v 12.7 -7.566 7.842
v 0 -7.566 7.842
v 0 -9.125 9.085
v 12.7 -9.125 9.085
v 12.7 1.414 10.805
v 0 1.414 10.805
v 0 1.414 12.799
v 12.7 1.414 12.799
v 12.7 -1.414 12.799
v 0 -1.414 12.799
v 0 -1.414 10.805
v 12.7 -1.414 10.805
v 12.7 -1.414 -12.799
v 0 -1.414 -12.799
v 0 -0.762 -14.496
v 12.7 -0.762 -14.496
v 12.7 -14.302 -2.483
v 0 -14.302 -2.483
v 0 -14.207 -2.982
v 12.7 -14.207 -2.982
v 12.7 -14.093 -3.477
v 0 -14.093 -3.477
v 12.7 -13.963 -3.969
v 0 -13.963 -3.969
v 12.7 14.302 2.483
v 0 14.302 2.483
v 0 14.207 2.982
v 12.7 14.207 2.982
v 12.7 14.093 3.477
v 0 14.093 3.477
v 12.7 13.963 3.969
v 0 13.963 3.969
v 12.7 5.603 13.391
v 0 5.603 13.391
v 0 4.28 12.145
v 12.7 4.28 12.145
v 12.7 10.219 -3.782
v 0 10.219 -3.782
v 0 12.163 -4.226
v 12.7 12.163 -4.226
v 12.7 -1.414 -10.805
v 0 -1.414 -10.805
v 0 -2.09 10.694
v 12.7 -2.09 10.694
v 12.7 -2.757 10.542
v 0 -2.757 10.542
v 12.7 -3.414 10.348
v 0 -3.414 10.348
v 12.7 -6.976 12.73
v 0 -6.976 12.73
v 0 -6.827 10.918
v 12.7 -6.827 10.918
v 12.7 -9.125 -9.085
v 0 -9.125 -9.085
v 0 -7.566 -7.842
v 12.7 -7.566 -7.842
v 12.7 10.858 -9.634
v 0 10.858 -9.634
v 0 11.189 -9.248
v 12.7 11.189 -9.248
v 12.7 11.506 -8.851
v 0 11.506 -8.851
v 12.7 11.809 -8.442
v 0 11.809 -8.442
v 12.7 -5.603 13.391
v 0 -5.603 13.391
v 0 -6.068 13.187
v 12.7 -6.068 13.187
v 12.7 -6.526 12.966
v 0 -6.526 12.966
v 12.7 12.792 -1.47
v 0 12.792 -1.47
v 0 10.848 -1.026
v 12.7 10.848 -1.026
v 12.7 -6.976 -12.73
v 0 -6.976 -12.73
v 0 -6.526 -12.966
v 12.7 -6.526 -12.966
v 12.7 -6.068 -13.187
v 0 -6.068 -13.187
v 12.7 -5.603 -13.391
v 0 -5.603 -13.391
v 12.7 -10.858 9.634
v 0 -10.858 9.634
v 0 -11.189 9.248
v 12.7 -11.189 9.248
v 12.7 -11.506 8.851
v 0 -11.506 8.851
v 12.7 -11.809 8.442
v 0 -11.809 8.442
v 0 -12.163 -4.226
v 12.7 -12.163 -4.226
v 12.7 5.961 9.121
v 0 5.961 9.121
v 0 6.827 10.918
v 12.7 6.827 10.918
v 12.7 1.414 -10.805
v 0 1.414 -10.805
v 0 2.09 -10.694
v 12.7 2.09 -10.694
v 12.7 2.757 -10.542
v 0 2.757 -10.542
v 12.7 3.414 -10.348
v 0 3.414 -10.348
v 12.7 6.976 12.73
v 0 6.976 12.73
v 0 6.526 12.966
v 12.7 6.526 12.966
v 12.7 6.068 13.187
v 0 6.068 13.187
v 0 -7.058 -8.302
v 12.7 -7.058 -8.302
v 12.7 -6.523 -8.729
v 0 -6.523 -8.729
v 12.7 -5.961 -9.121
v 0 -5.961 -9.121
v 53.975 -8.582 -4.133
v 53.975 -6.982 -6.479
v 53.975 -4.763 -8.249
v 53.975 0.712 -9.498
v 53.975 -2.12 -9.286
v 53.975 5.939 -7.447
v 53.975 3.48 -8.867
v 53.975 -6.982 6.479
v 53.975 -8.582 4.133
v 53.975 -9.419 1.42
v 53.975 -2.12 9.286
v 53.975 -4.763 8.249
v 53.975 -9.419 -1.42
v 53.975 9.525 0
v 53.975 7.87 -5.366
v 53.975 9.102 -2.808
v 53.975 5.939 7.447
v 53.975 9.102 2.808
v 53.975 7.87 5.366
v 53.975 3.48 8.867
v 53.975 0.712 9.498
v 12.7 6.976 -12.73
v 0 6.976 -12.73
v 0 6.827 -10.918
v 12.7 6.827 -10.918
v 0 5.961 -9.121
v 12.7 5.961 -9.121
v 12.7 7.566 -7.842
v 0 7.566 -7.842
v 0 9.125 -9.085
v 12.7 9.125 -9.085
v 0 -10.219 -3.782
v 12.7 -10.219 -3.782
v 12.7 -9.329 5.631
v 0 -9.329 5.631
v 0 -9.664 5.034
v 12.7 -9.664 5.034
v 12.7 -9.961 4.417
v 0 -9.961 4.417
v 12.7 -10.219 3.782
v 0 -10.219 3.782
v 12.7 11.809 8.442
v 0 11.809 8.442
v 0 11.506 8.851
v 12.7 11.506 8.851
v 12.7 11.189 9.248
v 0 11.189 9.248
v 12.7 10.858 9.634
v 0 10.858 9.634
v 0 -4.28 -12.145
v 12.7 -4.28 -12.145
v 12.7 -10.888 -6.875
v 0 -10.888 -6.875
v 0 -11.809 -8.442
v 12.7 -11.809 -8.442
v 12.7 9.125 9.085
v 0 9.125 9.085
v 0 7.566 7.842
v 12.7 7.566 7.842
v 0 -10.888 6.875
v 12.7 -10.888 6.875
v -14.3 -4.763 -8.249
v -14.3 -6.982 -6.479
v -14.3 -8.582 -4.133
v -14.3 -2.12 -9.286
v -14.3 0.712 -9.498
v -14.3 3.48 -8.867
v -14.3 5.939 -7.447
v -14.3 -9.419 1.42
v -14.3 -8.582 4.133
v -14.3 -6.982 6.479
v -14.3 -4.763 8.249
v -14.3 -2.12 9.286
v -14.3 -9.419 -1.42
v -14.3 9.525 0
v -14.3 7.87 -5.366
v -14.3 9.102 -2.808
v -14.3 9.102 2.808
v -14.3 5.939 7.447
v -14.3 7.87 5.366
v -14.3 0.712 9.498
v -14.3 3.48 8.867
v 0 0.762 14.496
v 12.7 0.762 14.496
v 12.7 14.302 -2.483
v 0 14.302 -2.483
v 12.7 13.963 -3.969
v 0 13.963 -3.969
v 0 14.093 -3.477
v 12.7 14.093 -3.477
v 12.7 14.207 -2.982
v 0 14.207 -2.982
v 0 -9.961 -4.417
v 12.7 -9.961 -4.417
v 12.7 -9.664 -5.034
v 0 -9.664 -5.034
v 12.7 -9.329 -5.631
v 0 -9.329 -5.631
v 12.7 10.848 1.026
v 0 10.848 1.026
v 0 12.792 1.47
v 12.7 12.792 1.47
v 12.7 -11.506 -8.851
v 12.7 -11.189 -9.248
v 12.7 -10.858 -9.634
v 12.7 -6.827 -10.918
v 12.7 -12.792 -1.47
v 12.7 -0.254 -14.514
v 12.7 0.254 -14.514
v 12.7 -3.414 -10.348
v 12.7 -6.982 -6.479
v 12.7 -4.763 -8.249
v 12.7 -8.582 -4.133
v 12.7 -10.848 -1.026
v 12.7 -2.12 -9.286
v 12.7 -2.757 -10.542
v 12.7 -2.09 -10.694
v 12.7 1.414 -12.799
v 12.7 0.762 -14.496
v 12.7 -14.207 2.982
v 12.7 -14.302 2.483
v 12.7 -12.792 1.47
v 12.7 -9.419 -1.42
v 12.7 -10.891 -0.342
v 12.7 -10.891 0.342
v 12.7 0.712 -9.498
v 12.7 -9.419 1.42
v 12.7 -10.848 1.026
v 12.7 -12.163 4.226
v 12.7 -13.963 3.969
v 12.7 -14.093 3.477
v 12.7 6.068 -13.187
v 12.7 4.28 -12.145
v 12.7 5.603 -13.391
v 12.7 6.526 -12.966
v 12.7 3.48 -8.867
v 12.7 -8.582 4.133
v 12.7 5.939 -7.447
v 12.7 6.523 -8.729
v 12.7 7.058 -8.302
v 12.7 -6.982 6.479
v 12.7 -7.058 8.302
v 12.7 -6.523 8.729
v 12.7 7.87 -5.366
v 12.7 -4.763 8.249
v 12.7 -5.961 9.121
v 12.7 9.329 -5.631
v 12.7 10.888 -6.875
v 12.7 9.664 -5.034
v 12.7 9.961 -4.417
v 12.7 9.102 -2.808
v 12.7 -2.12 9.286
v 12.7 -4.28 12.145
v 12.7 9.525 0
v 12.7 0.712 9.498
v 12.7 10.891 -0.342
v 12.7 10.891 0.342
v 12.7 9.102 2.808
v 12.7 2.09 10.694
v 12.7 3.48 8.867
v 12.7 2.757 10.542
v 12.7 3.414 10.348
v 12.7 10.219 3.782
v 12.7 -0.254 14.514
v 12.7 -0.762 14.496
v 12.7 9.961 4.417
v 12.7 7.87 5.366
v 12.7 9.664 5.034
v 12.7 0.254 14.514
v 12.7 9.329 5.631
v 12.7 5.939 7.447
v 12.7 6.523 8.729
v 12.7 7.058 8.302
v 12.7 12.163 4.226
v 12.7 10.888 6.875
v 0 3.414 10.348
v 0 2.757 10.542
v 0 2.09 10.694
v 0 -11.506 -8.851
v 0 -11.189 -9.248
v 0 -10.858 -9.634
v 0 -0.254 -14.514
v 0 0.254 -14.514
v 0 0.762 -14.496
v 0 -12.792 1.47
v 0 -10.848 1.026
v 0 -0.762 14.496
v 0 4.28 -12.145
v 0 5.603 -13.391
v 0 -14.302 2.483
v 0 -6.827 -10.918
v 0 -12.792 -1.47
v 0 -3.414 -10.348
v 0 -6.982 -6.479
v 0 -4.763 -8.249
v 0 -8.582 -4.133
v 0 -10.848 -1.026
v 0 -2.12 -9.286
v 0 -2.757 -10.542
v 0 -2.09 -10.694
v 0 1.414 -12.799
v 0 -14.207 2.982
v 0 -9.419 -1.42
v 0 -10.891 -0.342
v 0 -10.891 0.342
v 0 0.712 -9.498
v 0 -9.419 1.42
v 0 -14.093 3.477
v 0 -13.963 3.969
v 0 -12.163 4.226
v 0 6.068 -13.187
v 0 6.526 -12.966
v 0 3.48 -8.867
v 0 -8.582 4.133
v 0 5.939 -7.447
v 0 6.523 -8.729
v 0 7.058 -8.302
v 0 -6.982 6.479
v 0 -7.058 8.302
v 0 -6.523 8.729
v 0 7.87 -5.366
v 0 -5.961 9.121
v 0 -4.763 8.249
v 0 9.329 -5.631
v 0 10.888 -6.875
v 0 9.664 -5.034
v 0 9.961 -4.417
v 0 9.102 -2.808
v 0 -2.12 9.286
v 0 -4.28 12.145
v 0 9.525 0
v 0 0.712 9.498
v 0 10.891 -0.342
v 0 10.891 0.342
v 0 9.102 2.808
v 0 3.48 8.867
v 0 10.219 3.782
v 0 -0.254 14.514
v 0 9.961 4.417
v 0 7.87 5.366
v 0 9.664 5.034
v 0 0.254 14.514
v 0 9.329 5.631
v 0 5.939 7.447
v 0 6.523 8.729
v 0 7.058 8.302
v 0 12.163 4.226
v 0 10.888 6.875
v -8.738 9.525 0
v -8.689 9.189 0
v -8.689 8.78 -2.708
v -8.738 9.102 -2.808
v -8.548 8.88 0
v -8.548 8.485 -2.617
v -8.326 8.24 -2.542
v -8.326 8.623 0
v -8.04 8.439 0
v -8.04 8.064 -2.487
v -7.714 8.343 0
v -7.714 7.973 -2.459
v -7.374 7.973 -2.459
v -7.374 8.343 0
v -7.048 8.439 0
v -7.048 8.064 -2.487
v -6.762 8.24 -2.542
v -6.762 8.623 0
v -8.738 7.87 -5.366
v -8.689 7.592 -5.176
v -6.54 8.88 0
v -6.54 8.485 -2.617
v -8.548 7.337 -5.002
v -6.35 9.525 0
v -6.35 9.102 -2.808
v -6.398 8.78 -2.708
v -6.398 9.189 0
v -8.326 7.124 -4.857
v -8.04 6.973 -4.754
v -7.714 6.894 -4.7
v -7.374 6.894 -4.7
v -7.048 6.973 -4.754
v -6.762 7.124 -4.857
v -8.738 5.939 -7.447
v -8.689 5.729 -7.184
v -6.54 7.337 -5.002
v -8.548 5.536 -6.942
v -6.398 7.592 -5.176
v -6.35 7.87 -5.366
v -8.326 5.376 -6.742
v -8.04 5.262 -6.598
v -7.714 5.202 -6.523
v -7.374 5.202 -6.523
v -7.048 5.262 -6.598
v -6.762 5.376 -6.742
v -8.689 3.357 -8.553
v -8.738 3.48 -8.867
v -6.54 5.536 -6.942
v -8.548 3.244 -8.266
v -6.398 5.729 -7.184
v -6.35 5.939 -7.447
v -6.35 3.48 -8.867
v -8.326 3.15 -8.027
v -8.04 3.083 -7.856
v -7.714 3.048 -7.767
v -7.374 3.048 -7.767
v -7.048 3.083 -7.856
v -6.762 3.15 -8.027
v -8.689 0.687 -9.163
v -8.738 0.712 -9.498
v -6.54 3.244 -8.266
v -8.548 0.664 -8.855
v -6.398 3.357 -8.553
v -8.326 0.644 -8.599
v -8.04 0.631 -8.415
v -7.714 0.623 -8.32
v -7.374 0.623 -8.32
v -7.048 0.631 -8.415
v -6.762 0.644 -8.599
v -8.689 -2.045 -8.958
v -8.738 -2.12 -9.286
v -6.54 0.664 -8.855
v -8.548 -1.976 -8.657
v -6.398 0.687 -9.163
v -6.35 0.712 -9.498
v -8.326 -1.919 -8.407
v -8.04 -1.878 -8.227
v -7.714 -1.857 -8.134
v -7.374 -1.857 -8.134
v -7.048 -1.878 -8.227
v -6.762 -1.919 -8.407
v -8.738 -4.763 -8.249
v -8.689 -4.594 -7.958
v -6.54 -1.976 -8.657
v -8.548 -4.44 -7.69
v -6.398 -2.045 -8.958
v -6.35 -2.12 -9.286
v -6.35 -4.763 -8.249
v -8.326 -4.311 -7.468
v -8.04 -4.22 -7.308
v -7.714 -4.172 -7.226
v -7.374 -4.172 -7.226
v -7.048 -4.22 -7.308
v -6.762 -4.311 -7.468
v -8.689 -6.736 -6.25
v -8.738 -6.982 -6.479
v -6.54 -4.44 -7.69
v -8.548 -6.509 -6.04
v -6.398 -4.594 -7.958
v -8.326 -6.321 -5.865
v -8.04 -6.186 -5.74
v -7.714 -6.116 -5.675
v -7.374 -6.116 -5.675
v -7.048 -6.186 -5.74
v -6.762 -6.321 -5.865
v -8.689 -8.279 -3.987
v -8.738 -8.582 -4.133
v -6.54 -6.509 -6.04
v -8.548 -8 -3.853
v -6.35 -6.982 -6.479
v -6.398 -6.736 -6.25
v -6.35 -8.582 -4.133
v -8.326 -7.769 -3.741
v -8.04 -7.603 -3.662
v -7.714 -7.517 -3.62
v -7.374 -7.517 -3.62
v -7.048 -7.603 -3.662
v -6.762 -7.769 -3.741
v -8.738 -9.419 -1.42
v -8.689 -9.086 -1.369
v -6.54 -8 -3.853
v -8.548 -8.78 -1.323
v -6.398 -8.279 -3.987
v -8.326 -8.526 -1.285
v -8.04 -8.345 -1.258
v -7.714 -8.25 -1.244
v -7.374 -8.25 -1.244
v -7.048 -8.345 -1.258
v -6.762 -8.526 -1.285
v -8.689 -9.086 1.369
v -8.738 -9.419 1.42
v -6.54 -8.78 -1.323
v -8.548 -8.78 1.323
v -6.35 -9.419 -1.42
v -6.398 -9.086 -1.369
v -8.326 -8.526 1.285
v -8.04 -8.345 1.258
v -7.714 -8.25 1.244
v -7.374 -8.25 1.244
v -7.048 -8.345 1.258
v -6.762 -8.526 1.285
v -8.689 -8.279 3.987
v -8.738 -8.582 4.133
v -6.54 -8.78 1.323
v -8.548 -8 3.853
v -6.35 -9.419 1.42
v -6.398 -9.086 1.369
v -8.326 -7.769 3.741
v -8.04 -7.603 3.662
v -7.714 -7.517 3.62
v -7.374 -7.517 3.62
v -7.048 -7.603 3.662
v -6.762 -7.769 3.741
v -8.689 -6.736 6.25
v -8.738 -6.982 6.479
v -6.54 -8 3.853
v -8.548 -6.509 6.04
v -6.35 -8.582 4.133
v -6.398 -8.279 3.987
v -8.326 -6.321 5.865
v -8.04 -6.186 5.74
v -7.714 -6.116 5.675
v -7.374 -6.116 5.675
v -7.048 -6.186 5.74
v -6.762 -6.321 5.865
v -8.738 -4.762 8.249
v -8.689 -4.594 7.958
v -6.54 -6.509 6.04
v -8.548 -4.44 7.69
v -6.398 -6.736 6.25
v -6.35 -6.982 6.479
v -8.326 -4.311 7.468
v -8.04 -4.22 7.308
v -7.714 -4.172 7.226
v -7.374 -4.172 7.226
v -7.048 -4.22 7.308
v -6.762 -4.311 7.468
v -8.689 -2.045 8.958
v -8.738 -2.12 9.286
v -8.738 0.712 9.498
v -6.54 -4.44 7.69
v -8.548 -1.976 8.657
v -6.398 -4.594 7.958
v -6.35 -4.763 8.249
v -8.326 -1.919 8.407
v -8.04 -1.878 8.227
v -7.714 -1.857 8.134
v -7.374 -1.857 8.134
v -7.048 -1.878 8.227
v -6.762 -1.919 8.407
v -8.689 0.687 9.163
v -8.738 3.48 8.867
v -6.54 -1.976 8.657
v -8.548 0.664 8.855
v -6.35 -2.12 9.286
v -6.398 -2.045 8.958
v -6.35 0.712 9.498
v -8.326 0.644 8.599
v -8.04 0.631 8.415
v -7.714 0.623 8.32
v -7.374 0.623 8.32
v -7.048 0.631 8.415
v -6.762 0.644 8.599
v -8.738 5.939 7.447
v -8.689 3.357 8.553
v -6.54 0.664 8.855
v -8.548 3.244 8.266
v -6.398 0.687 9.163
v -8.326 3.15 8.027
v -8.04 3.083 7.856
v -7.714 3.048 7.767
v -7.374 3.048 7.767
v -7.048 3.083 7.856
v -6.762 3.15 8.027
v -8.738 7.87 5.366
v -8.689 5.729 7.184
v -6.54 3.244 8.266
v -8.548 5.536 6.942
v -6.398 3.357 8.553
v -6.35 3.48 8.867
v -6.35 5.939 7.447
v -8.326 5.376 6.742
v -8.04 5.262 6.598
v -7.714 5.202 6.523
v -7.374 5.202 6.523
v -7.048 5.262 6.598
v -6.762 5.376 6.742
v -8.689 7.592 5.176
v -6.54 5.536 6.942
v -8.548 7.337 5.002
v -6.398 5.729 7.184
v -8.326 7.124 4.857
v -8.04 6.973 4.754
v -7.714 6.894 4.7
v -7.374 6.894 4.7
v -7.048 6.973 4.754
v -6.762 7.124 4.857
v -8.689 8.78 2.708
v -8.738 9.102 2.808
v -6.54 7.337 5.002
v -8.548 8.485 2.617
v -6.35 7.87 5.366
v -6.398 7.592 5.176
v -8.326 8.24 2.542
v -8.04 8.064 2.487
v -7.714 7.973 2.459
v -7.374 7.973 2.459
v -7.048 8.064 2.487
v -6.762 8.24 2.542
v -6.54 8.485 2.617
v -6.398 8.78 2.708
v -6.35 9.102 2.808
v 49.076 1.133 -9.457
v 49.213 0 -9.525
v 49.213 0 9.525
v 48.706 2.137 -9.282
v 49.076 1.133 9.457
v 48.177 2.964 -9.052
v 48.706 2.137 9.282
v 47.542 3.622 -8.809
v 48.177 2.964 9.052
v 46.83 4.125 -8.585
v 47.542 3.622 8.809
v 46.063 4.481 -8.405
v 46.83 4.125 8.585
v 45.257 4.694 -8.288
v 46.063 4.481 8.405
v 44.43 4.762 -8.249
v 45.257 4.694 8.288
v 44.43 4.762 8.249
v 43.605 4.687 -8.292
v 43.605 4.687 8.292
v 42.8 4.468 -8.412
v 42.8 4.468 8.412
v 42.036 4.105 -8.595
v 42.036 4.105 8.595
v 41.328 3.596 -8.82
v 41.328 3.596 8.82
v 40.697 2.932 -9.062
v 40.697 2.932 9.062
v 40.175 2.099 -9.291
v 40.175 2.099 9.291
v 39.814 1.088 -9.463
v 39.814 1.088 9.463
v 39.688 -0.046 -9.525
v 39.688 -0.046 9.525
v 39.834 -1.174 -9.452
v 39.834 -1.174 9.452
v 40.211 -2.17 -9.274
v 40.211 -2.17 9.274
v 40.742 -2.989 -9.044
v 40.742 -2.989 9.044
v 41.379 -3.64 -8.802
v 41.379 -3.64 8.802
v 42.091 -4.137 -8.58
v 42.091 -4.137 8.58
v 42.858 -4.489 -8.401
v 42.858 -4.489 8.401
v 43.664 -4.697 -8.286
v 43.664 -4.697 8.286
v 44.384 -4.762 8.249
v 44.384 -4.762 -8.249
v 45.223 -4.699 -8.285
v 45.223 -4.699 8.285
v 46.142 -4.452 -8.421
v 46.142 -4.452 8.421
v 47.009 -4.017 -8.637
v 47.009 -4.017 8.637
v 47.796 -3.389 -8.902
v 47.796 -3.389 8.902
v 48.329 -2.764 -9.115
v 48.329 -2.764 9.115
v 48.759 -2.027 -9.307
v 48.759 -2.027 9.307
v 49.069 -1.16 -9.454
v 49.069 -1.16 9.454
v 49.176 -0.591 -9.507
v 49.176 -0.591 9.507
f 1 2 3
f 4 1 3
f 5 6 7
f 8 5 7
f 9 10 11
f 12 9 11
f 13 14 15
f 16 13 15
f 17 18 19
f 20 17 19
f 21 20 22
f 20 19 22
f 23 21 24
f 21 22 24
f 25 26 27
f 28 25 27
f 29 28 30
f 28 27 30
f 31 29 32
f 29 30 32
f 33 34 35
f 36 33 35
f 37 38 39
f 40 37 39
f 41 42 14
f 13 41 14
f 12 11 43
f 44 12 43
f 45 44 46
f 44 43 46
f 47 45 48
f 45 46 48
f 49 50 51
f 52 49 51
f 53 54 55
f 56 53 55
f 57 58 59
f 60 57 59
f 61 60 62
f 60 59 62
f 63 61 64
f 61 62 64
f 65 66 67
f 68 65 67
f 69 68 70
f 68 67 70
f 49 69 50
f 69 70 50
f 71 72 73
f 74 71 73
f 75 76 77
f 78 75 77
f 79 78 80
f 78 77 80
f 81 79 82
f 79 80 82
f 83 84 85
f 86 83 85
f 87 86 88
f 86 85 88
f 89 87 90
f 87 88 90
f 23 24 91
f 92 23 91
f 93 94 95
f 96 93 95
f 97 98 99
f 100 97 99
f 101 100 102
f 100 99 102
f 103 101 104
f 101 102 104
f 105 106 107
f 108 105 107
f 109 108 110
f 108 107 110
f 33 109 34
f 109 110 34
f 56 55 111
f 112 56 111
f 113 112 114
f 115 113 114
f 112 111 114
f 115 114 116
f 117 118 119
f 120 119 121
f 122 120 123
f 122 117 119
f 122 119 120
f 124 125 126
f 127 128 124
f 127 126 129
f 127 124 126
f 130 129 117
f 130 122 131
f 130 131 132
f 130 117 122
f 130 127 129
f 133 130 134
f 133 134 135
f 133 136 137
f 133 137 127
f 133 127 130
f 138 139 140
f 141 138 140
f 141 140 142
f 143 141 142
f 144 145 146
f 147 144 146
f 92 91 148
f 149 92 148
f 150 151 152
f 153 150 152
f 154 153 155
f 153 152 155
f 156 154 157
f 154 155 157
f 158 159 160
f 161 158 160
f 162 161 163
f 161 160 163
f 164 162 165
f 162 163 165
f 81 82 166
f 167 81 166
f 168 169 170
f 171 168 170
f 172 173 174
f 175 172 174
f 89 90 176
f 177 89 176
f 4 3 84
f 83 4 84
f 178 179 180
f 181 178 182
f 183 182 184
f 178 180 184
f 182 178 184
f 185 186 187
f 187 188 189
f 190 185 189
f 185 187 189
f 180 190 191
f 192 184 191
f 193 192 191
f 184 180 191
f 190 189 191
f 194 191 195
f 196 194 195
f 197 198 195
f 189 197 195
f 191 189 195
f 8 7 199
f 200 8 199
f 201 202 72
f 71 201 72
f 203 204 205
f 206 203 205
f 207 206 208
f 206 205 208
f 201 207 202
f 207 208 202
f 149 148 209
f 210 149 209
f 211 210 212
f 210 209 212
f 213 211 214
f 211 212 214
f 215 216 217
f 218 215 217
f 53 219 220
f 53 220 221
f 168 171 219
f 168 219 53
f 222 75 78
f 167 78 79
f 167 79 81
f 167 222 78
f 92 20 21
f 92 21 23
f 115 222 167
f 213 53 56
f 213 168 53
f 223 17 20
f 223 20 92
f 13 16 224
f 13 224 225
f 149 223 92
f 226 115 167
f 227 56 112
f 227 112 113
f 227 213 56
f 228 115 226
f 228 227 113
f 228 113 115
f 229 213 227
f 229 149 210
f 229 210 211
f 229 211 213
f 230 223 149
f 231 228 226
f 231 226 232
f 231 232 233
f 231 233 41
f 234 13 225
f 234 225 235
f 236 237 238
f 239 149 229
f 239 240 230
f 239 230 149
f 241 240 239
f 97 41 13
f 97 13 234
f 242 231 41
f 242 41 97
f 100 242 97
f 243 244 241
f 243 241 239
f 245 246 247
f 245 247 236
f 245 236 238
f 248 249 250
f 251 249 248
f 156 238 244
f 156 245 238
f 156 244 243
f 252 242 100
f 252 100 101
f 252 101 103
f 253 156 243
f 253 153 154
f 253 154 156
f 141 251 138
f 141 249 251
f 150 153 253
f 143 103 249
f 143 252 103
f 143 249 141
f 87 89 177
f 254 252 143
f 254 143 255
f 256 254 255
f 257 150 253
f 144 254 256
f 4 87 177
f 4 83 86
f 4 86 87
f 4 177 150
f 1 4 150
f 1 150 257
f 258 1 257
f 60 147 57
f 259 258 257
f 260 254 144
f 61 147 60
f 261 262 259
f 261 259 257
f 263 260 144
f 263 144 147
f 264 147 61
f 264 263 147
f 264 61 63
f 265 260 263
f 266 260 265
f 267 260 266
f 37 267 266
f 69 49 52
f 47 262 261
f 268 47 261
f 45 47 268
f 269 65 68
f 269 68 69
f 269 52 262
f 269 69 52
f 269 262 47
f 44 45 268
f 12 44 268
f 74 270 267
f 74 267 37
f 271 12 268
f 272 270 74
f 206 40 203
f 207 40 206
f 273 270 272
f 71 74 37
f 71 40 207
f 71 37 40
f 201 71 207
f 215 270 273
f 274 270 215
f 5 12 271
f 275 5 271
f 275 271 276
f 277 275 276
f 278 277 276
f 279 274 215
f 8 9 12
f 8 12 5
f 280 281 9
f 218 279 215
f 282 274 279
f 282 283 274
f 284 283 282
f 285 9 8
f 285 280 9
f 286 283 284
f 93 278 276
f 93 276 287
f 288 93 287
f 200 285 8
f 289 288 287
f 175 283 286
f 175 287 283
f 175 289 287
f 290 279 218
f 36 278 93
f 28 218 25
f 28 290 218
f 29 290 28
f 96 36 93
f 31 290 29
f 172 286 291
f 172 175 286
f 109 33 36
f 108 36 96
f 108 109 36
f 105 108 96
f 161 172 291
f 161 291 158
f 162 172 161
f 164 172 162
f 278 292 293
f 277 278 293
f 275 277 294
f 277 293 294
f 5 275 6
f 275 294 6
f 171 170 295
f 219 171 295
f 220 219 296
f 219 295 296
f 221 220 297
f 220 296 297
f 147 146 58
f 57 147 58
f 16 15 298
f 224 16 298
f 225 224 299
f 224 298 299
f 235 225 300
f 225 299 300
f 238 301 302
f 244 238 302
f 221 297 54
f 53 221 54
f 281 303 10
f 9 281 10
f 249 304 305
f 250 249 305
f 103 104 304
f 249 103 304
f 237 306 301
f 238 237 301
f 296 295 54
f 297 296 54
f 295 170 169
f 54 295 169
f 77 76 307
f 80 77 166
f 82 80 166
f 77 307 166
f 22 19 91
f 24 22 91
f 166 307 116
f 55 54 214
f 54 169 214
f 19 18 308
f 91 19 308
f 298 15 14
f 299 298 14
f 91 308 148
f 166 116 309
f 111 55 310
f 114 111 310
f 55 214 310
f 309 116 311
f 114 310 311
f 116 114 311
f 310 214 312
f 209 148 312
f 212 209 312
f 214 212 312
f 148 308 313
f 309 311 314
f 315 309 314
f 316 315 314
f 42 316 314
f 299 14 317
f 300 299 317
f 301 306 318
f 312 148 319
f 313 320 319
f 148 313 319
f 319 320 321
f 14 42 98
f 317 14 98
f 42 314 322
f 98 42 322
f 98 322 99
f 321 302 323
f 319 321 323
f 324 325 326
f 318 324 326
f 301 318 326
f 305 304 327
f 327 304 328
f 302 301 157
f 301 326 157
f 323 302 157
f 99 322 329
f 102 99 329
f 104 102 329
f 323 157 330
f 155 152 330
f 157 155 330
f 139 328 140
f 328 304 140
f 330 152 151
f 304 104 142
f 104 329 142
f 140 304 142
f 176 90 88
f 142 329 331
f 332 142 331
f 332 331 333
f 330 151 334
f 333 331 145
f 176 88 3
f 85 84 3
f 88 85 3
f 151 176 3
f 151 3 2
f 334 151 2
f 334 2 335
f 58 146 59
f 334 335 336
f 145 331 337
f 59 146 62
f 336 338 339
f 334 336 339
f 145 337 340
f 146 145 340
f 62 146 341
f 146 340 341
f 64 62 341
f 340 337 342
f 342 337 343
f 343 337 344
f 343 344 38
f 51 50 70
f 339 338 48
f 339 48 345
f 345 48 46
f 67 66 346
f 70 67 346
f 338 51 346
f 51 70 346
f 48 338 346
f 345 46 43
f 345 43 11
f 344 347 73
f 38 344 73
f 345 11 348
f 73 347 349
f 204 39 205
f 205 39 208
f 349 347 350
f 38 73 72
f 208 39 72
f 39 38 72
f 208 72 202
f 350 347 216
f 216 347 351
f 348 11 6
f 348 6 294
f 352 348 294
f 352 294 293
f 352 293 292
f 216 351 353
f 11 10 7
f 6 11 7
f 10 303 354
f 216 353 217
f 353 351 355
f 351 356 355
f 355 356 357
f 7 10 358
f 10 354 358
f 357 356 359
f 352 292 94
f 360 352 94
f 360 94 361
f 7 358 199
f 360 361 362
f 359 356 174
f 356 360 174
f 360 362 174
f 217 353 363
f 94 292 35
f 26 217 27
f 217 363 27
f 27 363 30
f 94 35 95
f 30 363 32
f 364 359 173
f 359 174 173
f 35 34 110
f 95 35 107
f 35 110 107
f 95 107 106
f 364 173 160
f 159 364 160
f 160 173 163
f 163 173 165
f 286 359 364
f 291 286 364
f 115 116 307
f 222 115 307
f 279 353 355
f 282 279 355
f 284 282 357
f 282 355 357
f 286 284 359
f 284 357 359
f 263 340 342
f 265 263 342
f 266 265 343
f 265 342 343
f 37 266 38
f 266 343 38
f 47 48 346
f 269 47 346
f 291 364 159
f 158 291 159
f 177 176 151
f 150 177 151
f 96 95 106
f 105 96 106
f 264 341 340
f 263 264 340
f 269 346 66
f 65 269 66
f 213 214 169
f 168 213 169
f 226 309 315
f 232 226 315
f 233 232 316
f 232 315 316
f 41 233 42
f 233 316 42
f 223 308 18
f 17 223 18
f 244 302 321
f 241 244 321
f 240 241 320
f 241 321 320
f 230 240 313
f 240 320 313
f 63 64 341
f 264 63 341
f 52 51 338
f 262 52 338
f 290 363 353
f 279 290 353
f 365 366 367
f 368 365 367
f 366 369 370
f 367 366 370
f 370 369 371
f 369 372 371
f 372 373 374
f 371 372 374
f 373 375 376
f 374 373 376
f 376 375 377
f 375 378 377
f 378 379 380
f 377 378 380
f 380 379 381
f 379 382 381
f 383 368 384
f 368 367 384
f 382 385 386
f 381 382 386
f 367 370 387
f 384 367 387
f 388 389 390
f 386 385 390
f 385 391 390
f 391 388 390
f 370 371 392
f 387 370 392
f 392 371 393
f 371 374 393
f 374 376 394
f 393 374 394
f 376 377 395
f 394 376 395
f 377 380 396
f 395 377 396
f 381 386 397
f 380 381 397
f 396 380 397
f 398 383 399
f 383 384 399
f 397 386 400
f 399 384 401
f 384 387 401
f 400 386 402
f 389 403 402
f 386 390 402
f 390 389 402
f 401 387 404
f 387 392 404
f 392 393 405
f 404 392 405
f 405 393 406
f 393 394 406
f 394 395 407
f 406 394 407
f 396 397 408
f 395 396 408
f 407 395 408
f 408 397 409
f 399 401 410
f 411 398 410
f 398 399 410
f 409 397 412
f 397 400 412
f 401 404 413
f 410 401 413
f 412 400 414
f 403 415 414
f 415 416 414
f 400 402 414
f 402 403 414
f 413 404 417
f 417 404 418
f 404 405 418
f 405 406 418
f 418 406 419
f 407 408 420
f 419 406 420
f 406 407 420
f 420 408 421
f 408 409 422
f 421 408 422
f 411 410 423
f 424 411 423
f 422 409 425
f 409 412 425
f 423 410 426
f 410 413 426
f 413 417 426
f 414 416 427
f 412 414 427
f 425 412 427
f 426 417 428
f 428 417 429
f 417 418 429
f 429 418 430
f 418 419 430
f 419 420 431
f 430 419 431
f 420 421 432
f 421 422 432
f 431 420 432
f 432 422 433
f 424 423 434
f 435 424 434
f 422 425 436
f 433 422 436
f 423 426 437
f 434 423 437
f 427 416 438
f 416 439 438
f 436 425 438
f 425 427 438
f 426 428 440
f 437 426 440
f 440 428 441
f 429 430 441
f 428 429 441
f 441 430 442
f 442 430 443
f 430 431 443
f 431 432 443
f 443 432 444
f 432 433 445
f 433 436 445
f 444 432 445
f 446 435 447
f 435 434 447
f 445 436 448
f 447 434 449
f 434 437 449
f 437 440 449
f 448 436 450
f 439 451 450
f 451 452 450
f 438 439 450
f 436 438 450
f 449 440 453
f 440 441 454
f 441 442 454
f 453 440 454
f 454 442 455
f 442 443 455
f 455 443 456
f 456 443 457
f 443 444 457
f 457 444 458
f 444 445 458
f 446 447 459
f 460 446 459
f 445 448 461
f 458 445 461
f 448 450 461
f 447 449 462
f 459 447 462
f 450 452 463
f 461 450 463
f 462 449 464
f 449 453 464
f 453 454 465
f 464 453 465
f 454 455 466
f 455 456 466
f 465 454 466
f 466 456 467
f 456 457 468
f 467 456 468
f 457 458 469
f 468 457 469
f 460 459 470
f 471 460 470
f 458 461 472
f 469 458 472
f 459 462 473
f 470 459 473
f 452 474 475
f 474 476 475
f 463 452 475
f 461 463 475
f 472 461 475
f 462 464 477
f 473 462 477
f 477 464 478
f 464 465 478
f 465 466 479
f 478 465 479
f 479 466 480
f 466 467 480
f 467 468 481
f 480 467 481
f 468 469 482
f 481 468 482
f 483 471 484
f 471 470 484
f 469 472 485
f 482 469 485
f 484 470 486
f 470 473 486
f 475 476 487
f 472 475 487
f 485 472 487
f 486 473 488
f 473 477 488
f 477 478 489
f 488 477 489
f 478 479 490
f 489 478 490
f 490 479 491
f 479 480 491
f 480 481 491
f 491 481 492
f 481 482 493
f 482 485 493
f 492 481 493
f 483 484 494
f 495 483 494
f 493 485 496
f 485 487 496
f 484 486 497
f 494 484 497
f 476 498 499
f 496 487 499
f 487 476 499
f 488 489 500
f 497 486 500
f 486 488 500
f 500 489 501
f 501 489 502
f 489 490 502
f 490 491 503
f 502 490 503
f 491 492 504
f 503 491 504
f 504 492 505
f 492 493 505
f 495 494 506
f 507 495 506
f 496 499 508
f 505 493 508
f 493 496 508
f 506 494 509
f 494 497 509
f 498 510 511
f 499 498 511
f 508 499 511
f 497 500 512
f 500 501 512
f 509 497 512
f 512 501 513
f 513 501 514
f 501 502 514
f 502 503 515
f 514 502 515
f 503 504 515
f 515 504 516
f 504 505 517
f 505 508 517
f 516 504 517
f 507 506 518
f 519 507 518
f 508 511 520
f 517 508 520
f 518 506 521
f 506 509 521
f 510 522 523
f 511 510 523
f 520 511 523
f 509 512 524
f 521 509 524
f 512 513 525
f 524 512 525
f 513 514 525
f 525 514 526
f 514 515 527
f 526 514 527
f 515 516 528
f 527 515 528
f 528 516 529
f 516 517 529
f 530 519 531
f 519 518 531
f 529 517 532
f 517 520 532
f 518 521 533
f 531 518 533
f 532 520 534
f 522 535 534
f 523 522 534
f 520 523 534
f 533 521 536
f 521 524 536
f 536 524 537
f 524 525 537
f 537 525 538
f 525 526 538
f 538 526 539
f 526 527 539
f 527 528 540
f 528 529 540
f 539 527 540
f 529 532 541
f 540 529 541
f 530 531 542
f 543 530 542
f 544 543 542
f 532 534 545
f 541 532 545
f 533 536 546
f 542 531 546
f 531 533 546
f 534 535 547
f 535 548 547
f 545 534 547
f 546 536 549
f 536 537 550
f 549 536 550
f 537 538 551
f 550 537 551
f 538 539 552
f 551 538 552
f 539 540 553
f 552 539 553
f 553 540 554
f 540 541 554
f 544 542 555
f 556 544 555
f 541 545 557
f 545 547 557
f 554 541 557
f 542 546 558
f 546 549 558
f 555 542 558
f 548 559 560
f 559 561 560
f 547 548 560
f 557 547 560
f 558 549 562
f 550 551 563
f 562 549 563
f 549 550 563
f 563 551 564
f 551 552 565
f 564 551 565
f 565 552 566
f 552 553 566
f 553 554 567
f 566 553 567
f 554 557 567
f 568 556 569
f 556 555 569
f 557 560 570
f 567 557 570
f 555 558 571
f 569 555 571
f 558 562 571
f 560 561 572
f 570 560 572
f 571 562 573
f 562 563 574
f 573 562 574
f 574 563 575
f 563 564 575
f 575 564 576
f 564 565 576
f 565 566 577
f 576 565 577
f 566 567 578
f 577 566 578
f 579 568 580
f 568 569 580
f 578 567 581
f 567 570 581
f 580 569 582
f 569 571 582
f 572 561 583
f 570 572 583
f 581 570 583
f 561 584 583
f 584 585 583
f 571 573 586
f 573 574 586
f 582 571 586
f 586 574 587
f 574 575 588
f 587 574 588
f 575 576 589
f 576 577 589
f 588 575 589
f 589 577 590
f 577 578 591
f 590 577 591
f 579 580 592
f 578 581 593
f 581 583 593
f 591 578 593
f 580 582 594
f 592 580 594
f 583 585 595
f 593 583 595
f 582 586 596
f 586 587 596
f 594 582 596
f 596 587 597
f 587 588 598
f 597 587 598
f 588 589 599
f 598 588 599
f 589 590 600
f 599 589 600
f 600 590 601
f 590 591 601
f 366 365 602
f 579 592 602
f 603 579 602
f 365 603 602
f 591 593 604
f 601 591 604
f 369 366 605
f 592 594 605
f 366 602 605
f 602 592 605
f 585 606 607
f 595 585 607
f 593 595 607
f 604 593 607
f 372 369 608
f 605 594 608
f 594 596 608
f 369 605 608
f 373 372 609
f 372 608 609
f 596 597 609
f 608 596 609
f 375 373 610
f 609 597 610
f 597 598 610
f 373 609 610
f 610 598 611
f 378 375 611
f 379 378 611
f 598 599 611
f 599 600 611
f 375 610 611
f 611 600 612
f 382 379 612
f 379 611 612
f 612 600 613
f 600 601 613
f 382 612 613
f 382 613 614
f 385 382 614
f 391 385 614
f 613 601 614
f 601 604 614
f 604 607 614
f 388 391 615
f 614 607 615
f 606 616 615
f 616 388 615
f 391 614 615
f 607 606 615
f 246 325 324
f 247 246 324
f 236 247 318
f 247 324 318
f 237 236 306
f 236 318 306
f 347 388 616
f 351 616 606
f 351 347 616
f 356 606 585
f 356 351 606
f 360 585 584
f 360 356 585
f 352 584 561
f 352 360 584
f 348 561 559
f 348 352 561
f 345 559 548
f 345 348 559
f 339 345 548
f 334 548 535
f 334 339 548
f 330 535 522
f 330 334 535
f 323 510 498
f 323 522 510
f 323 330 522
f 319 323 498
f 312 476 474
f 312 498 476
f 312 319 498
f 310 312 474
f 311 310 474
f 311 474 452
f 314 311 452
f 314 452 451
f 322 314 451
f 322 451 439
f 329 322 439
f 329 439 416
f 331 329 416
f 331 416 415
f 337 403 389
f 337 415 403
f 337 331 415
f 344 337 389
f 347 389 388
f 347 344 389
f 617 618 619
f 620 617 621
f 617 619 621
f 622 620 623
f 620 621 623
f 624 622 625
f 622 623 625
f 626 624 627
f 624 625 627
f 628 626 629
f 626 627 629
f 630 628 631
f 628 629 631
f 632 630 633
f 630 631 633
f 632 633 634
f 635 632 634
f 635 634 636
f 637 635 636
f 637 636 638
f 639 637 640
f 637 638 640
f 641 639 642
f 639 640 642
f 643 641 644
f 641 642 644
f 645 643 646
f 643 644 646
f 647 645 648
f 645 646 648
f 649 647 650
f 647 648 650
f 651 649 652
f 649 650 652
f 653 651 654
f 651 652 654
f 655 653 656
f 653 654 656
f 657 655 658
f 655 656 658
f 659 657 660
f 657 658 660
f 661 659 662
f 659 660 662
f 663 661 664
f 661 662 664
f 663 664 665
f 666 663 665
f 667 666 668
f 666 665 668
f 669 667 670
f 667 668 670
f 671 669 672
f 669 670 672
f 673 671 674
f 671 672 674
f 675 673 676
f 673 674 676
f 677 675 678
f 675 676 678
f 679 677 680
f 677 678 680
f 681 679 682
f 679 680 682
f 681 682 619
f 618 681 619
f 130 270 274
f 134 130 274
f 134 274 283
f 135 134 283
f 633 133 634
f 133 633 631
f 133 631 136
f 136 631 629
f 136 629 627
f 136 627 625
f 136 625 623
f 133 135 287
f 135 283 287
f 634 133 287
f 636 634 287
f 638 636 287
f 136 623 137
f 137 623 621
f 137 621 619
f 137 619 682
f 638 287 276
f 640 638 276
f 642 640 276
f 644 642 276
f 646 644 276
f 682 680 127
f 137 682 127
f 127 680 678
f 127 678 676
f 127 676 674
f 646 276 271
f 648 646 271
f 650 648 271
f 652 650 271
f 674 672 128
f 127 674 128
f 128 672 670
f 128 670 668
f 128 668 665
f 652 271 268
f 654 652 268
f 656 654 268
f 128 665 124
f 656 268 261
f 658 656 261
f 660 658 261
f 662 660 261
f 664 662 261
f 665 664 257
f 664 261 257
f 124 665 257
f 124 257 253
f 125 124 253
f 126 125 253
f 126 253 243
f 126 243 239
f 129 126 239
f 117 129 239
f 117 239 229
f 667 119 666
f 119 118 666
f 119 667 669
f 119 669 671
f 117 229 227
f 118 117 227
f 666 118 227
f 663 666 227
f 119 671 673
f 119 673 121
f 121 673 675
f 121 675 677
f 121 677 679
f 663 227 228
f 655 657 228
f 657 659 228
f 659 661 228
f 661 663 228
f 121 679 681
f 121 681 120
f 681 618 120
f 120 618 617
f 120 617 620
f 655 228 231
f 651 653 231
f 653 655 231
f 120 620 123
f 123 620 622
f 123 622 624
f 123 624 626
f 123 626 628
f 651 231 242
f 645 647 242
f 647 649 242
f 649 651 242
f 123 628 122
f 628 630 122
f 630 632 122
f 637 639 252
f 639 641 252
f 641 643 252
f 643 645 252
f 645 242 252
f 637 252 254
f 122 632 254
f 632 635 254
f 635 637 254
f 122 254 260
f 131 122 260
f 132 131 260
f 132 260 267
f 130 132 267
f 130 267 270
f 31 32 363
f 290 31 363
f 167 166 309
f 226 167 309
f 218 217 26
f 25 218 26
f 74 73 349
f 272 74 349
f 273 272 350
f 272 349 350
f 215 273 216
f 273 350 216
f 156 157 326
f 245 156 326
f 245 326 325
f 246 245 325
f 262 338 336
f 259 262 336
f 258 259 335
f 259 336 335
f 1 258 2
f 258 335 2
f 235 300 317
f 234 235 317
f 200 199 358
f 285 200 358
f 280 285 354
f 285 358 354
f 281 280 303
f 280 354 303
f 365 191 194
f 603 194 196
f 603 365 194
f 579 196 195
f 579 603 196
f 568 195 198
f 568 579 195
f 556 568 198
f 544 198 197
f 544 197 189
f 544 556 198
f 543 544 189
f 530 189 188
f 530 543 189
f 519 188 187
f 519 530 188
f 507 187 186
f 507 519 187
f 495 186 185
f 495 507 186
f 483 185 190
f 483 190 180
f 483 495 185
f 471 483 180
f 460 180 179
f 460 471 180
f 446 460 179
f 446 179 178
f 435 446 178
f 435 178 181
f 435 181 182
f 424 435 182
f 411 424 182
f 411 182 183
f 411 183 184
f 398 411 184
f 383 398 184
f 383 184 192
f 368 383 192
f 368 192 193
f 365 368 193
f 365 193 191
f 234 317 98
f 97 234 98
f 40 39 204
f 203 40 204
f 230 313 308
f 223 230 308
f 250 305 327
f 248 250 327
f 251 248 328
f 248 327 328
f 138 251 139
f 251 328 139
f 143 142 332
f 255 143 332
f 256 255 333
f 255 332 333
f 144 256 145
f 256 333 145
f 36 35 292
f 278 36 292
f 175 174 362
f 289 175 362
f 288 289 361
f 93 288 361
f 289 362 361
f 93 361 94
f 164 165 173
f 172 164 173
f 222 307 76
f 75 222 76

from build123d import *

# Parameters (mm, degrees)
F0_R     = 9.525
F1_DEPTH = 14.3002
F3_DEPTH = 12.7
F4_R     = 9.525
F5_DEPTH = 41.275
F6_R     = 1.1938
F8_R     = 4.7625
F9_DEPTH = 12.7


with BuildPart() as f1:
    # F0 (on Right) → F1 (new body)
    with BuildSketch(Plane.YZ):
        Circle(F0_R)
    extrude(amount=-F1_DEPTH)

    # F2 (on face) → F3 (join)
    with BuildSketch(Plane.YZ):
        with BuildLine():
            Line((1.413542, 12.798762), (0.762, 14.496086))
            ThreePointArc((0.762, 14.496086), (0, 14.5161), (-0.762, 14.496086))
            Line((-0.762, 14.496086), (-1.413542, 12.798762))
            Line((-1.413542, 12.798762), (-1.413542, 10.804526))
            ThreePointArc((-1.413542, 10.804526), (-2.424722, 10.623399), (-3.414351, 10.347855))
            Line((-3.414351, 10.347855), (-4.279618, 12.144599))
            Line((-4.279618, 12.144599), (-5.603078, 13.391142))
            ThreePointArc((-5.603078, 13.391142), (-6.2983, 13.078554), (-6.976154, 12.729903))
            Line((-6.976154, 12.729903), (-6.826732, 10.917973))
            Line((-6.826732, 10.917973), (-5.961465, 9.121229))
            ThreePointArc((-5.961465, 9.121229), (-6.793919, 8.519305), (-7.56599, 7.841663))
            Line((-7.56599, 7.841663), (-9.125146, 9.085049))
            Line((-9.125146, 9.085049), (-10.858397, 9.633918))
            ThreePointArc((-10.858397, 9.633918), (-11.349144, 9.05064), (-11.808596, 8.442406))
            Line((-11.808596, 8.442406), (-10.887804, 6.874746))
            Line((-10.887804, 6.874746), (-9.328648, 5.631361))
            ThreePointArc((-9.328648, 5.631361), (-9.817497, 4.727858), (-10.219092, 3.782335))
            Line((-10.219092, 3.782335), (-12.163328, 4.226094))
            Line((-12.163328, 4.226094), (-13.963078, 3.968578))
            ThreePointArc((-13.963078, 3.968578), (-14.152151, 3.230136), (-14.3022, 2.482788))
            Line((-14.3022, 2.482788), (-12.792413, 1.469891))
            Line((-12.792413, 1.469891), (-10.848177, 1.026132))
            ThreePointArc((-10.848177, 1.026132), (-10.8966, 0), (-10.848177, -1.026132))
            Line((-10.848177, -1.026132), (-12.792413, -1.469891))
            Line((-12.792413, -1.469891), (-14.3022, -2.482788))
            ThreePointArc((-14.3022, -2.482788), (-14.152151, -3.230136), (-13.963078, -3.968578))
            Line((-13.963078, -3.968578), (-12.163328, -4.226094))
            Line((-12.163328, -4.226094), (-10.219092, -3.782335))
            ThreePointArc((-10.219092, -3.782335), (-9.817497, -4.727858), (-9.328648, -5.631361))
            Line((-9.328648, -5.631361), (-10.887804, -6.874746))
            Line((-10.887804, -6.874746), (-11.808596, -8.442406))
            ThreePointArc((-11.808596, -8.442406), (-11.349144, -9.05064), (-10.858397, -9.633918))
            Line((-10.858397, -9.633918), (-9.125146, -9.085049))
            Line((-9.125146, -9.085049), (-7.56599, -7.841663))
            ThreePointArc((-7.56599, -7.841663), (-6.793919, -8.519305), (-5.961465, -9.121229))
            Line((-5.961465, -9.121229), (-6.826732, -10.917973))
            Line((-6.826732, -10.917973), (-6.976154, -12.729903))
            ThreePointArc((-6.976154, -12.729903), (-6.2983, -13.078554), (-5.603078, -13.391142))
            Line((-5.603078, -13.391142), (-4.279618, -12.144599))
            Line((-4.279618, -12.144599), (-3.414351, -10.347855))
            ThreePointArc((-3.414351, -10.347855), (-2.424722, -10.623399), (-1.413542, -10.804526))
            Line((-1.413542, -10.804526), (-1.413542, -12.798762))
            Line((-1.413542, -12.798762), (-0.762, -14.496086))
            ThreePointArc((-0.762, -14.496086), (0, -14.5161), (0.762, -14.496086))
            Line((0.762, -14.496086), (1.413542, -12.798762))
            Line((1.413542, -12.798762), (1.413542, -10.804526))
            ThreePointArc((1.413542, -10.804526), (2.424722, -10.623399), (3.414351, -10.347855))
            Line((3.414351, -10.347855), (4.279618, -12.144599))
            Line((4.279618, -12.144599), (5.603078, -13.391142))
            ThreePointArc((5.603078, -13.391142), (6.2983, -13.078554), (6.976154, -12.729903))
            Line((6.976154, -12.729903), (6.826732, -10.917973))
            Line((6.826732, -10.917973), (5.961465, -9.121229))
            ThreePointArc((5.961465, -9.121229), (6.793919, -8.519305), (7.56599, -7.841663))
            Line((7.56599, -7.841663), (9.125146, -9.085049))
            Line((9.125146, -9.085049), (10.858397, -9.633918))
            ThreePointArc((10.858397, -9.633918), (11.349144, -9.05064), (11.808596, -8.442406))
            Line((11.808596, -8.442406), (10.887804, -6.874746))
            Line((10.887804, -6.874746), (9.328648, -5.631361))
            ThreePointArc((9.328648, -5.631361), (9.817497, -4.727858), (10.219092, -3.782335))
            Line((10.219092, -3.782335), (12.163328, -4.226094))
            Line((12.163328, -4.226094), (13.963078, -3.968578))
            ThreePointArc((13.963078, -3.968578), (14.152151, -3.230136), (14.3022, -2.482788))
            Line((14.3022, -2.482788), (12.792413, -1.469891))
            Line((12.792413, -1.469891), (10.848177, -1.026132))
            ThreePointArc((10.848177, -1.026132), (10.8966, 0), (10.848177, 1.026132))
            Line((10.848177, 1.026132), (12.792413, 1.469891))
            Line((12.792413, 1.469891), (14.3022, 2.482788))
            ThreePointArc((14.3022, 2.482788), (14.152151, 3.230136), (13.963078, 3.968578))
            Line((13.963078, 3.968578), (12.163328, 4.226094))
            Line((12.163328, 4.226094), (10.219092, 3.782335))
            ThreePointArc((10.219092, 3.782335), (9.817497, 4.727858), (9.328648, 5.631361))
            Line((9.328648, 5.631361), (10.887804, 6.874746))
            Line((10.887804, 6.874746), (11.808596, 8.442406))
            ThreePointArc((11.808596, 8.442406), (11.349144, 9.05064), (10.858397, 9.633918))
            Line((10.858397, 9.633918), (9.125146, 9.085049))
            Line((9.125146, 9.085049), (7.56599, 7.841663))
            ThreePointArc((7.56599, 7.841663), (6.793919, 8.519305), (5.961465, 9.121229))
            Line((5.961465, 9.121229), (6.826732, 10.917973))
            Line((6.826732, 10.917973), (6.976154, 12.729903))
            ThreePointArc((6.976154, 12.729903), (6.2983, 13.078554), (5.603078, 13.391142))
            Line((5.603078, 13.391142), (4.279618, 12.144599))
            Line((4.279618, 12.144599), (3.414351, 10.347855))
            ThreePointArc((3.414351, 10.347855), (2.424722, 10.623399), (1.413542, 10.804526))
            Line((1.413542, 10.804526), (1.413542, 12.798762))
        make_face()
    extrude(amount=F3_DEPTH)

    # F4 (on face) → F5 (join)
    with BuildSketch(Plane.YZ.offset(12.7)):
        Circle(F4_R)
    extrude(amount=F5_DEPTH)

    # F6 (on Top) → F7 (revolve, cut)
    with BuildSketch(Plane.XY):
        with Locations((-7.5438, 9.525)):
            Circle(F6_R)
    revolve(axis=Axis((-10.466062, 0, 0), (-1, 0, 0)), mode=Mode.SUBTRACT)

    # F8 (on Top) → F9 (cut, symmetric)
    with BuildSketch(Plane.XY):
        with Locations((44.45, 0)):
            Circle(F8_R)
    extrude(amount=F9_DEPTH, both=True, mode=Mode.SUBTRACT)


solid = f1.part
